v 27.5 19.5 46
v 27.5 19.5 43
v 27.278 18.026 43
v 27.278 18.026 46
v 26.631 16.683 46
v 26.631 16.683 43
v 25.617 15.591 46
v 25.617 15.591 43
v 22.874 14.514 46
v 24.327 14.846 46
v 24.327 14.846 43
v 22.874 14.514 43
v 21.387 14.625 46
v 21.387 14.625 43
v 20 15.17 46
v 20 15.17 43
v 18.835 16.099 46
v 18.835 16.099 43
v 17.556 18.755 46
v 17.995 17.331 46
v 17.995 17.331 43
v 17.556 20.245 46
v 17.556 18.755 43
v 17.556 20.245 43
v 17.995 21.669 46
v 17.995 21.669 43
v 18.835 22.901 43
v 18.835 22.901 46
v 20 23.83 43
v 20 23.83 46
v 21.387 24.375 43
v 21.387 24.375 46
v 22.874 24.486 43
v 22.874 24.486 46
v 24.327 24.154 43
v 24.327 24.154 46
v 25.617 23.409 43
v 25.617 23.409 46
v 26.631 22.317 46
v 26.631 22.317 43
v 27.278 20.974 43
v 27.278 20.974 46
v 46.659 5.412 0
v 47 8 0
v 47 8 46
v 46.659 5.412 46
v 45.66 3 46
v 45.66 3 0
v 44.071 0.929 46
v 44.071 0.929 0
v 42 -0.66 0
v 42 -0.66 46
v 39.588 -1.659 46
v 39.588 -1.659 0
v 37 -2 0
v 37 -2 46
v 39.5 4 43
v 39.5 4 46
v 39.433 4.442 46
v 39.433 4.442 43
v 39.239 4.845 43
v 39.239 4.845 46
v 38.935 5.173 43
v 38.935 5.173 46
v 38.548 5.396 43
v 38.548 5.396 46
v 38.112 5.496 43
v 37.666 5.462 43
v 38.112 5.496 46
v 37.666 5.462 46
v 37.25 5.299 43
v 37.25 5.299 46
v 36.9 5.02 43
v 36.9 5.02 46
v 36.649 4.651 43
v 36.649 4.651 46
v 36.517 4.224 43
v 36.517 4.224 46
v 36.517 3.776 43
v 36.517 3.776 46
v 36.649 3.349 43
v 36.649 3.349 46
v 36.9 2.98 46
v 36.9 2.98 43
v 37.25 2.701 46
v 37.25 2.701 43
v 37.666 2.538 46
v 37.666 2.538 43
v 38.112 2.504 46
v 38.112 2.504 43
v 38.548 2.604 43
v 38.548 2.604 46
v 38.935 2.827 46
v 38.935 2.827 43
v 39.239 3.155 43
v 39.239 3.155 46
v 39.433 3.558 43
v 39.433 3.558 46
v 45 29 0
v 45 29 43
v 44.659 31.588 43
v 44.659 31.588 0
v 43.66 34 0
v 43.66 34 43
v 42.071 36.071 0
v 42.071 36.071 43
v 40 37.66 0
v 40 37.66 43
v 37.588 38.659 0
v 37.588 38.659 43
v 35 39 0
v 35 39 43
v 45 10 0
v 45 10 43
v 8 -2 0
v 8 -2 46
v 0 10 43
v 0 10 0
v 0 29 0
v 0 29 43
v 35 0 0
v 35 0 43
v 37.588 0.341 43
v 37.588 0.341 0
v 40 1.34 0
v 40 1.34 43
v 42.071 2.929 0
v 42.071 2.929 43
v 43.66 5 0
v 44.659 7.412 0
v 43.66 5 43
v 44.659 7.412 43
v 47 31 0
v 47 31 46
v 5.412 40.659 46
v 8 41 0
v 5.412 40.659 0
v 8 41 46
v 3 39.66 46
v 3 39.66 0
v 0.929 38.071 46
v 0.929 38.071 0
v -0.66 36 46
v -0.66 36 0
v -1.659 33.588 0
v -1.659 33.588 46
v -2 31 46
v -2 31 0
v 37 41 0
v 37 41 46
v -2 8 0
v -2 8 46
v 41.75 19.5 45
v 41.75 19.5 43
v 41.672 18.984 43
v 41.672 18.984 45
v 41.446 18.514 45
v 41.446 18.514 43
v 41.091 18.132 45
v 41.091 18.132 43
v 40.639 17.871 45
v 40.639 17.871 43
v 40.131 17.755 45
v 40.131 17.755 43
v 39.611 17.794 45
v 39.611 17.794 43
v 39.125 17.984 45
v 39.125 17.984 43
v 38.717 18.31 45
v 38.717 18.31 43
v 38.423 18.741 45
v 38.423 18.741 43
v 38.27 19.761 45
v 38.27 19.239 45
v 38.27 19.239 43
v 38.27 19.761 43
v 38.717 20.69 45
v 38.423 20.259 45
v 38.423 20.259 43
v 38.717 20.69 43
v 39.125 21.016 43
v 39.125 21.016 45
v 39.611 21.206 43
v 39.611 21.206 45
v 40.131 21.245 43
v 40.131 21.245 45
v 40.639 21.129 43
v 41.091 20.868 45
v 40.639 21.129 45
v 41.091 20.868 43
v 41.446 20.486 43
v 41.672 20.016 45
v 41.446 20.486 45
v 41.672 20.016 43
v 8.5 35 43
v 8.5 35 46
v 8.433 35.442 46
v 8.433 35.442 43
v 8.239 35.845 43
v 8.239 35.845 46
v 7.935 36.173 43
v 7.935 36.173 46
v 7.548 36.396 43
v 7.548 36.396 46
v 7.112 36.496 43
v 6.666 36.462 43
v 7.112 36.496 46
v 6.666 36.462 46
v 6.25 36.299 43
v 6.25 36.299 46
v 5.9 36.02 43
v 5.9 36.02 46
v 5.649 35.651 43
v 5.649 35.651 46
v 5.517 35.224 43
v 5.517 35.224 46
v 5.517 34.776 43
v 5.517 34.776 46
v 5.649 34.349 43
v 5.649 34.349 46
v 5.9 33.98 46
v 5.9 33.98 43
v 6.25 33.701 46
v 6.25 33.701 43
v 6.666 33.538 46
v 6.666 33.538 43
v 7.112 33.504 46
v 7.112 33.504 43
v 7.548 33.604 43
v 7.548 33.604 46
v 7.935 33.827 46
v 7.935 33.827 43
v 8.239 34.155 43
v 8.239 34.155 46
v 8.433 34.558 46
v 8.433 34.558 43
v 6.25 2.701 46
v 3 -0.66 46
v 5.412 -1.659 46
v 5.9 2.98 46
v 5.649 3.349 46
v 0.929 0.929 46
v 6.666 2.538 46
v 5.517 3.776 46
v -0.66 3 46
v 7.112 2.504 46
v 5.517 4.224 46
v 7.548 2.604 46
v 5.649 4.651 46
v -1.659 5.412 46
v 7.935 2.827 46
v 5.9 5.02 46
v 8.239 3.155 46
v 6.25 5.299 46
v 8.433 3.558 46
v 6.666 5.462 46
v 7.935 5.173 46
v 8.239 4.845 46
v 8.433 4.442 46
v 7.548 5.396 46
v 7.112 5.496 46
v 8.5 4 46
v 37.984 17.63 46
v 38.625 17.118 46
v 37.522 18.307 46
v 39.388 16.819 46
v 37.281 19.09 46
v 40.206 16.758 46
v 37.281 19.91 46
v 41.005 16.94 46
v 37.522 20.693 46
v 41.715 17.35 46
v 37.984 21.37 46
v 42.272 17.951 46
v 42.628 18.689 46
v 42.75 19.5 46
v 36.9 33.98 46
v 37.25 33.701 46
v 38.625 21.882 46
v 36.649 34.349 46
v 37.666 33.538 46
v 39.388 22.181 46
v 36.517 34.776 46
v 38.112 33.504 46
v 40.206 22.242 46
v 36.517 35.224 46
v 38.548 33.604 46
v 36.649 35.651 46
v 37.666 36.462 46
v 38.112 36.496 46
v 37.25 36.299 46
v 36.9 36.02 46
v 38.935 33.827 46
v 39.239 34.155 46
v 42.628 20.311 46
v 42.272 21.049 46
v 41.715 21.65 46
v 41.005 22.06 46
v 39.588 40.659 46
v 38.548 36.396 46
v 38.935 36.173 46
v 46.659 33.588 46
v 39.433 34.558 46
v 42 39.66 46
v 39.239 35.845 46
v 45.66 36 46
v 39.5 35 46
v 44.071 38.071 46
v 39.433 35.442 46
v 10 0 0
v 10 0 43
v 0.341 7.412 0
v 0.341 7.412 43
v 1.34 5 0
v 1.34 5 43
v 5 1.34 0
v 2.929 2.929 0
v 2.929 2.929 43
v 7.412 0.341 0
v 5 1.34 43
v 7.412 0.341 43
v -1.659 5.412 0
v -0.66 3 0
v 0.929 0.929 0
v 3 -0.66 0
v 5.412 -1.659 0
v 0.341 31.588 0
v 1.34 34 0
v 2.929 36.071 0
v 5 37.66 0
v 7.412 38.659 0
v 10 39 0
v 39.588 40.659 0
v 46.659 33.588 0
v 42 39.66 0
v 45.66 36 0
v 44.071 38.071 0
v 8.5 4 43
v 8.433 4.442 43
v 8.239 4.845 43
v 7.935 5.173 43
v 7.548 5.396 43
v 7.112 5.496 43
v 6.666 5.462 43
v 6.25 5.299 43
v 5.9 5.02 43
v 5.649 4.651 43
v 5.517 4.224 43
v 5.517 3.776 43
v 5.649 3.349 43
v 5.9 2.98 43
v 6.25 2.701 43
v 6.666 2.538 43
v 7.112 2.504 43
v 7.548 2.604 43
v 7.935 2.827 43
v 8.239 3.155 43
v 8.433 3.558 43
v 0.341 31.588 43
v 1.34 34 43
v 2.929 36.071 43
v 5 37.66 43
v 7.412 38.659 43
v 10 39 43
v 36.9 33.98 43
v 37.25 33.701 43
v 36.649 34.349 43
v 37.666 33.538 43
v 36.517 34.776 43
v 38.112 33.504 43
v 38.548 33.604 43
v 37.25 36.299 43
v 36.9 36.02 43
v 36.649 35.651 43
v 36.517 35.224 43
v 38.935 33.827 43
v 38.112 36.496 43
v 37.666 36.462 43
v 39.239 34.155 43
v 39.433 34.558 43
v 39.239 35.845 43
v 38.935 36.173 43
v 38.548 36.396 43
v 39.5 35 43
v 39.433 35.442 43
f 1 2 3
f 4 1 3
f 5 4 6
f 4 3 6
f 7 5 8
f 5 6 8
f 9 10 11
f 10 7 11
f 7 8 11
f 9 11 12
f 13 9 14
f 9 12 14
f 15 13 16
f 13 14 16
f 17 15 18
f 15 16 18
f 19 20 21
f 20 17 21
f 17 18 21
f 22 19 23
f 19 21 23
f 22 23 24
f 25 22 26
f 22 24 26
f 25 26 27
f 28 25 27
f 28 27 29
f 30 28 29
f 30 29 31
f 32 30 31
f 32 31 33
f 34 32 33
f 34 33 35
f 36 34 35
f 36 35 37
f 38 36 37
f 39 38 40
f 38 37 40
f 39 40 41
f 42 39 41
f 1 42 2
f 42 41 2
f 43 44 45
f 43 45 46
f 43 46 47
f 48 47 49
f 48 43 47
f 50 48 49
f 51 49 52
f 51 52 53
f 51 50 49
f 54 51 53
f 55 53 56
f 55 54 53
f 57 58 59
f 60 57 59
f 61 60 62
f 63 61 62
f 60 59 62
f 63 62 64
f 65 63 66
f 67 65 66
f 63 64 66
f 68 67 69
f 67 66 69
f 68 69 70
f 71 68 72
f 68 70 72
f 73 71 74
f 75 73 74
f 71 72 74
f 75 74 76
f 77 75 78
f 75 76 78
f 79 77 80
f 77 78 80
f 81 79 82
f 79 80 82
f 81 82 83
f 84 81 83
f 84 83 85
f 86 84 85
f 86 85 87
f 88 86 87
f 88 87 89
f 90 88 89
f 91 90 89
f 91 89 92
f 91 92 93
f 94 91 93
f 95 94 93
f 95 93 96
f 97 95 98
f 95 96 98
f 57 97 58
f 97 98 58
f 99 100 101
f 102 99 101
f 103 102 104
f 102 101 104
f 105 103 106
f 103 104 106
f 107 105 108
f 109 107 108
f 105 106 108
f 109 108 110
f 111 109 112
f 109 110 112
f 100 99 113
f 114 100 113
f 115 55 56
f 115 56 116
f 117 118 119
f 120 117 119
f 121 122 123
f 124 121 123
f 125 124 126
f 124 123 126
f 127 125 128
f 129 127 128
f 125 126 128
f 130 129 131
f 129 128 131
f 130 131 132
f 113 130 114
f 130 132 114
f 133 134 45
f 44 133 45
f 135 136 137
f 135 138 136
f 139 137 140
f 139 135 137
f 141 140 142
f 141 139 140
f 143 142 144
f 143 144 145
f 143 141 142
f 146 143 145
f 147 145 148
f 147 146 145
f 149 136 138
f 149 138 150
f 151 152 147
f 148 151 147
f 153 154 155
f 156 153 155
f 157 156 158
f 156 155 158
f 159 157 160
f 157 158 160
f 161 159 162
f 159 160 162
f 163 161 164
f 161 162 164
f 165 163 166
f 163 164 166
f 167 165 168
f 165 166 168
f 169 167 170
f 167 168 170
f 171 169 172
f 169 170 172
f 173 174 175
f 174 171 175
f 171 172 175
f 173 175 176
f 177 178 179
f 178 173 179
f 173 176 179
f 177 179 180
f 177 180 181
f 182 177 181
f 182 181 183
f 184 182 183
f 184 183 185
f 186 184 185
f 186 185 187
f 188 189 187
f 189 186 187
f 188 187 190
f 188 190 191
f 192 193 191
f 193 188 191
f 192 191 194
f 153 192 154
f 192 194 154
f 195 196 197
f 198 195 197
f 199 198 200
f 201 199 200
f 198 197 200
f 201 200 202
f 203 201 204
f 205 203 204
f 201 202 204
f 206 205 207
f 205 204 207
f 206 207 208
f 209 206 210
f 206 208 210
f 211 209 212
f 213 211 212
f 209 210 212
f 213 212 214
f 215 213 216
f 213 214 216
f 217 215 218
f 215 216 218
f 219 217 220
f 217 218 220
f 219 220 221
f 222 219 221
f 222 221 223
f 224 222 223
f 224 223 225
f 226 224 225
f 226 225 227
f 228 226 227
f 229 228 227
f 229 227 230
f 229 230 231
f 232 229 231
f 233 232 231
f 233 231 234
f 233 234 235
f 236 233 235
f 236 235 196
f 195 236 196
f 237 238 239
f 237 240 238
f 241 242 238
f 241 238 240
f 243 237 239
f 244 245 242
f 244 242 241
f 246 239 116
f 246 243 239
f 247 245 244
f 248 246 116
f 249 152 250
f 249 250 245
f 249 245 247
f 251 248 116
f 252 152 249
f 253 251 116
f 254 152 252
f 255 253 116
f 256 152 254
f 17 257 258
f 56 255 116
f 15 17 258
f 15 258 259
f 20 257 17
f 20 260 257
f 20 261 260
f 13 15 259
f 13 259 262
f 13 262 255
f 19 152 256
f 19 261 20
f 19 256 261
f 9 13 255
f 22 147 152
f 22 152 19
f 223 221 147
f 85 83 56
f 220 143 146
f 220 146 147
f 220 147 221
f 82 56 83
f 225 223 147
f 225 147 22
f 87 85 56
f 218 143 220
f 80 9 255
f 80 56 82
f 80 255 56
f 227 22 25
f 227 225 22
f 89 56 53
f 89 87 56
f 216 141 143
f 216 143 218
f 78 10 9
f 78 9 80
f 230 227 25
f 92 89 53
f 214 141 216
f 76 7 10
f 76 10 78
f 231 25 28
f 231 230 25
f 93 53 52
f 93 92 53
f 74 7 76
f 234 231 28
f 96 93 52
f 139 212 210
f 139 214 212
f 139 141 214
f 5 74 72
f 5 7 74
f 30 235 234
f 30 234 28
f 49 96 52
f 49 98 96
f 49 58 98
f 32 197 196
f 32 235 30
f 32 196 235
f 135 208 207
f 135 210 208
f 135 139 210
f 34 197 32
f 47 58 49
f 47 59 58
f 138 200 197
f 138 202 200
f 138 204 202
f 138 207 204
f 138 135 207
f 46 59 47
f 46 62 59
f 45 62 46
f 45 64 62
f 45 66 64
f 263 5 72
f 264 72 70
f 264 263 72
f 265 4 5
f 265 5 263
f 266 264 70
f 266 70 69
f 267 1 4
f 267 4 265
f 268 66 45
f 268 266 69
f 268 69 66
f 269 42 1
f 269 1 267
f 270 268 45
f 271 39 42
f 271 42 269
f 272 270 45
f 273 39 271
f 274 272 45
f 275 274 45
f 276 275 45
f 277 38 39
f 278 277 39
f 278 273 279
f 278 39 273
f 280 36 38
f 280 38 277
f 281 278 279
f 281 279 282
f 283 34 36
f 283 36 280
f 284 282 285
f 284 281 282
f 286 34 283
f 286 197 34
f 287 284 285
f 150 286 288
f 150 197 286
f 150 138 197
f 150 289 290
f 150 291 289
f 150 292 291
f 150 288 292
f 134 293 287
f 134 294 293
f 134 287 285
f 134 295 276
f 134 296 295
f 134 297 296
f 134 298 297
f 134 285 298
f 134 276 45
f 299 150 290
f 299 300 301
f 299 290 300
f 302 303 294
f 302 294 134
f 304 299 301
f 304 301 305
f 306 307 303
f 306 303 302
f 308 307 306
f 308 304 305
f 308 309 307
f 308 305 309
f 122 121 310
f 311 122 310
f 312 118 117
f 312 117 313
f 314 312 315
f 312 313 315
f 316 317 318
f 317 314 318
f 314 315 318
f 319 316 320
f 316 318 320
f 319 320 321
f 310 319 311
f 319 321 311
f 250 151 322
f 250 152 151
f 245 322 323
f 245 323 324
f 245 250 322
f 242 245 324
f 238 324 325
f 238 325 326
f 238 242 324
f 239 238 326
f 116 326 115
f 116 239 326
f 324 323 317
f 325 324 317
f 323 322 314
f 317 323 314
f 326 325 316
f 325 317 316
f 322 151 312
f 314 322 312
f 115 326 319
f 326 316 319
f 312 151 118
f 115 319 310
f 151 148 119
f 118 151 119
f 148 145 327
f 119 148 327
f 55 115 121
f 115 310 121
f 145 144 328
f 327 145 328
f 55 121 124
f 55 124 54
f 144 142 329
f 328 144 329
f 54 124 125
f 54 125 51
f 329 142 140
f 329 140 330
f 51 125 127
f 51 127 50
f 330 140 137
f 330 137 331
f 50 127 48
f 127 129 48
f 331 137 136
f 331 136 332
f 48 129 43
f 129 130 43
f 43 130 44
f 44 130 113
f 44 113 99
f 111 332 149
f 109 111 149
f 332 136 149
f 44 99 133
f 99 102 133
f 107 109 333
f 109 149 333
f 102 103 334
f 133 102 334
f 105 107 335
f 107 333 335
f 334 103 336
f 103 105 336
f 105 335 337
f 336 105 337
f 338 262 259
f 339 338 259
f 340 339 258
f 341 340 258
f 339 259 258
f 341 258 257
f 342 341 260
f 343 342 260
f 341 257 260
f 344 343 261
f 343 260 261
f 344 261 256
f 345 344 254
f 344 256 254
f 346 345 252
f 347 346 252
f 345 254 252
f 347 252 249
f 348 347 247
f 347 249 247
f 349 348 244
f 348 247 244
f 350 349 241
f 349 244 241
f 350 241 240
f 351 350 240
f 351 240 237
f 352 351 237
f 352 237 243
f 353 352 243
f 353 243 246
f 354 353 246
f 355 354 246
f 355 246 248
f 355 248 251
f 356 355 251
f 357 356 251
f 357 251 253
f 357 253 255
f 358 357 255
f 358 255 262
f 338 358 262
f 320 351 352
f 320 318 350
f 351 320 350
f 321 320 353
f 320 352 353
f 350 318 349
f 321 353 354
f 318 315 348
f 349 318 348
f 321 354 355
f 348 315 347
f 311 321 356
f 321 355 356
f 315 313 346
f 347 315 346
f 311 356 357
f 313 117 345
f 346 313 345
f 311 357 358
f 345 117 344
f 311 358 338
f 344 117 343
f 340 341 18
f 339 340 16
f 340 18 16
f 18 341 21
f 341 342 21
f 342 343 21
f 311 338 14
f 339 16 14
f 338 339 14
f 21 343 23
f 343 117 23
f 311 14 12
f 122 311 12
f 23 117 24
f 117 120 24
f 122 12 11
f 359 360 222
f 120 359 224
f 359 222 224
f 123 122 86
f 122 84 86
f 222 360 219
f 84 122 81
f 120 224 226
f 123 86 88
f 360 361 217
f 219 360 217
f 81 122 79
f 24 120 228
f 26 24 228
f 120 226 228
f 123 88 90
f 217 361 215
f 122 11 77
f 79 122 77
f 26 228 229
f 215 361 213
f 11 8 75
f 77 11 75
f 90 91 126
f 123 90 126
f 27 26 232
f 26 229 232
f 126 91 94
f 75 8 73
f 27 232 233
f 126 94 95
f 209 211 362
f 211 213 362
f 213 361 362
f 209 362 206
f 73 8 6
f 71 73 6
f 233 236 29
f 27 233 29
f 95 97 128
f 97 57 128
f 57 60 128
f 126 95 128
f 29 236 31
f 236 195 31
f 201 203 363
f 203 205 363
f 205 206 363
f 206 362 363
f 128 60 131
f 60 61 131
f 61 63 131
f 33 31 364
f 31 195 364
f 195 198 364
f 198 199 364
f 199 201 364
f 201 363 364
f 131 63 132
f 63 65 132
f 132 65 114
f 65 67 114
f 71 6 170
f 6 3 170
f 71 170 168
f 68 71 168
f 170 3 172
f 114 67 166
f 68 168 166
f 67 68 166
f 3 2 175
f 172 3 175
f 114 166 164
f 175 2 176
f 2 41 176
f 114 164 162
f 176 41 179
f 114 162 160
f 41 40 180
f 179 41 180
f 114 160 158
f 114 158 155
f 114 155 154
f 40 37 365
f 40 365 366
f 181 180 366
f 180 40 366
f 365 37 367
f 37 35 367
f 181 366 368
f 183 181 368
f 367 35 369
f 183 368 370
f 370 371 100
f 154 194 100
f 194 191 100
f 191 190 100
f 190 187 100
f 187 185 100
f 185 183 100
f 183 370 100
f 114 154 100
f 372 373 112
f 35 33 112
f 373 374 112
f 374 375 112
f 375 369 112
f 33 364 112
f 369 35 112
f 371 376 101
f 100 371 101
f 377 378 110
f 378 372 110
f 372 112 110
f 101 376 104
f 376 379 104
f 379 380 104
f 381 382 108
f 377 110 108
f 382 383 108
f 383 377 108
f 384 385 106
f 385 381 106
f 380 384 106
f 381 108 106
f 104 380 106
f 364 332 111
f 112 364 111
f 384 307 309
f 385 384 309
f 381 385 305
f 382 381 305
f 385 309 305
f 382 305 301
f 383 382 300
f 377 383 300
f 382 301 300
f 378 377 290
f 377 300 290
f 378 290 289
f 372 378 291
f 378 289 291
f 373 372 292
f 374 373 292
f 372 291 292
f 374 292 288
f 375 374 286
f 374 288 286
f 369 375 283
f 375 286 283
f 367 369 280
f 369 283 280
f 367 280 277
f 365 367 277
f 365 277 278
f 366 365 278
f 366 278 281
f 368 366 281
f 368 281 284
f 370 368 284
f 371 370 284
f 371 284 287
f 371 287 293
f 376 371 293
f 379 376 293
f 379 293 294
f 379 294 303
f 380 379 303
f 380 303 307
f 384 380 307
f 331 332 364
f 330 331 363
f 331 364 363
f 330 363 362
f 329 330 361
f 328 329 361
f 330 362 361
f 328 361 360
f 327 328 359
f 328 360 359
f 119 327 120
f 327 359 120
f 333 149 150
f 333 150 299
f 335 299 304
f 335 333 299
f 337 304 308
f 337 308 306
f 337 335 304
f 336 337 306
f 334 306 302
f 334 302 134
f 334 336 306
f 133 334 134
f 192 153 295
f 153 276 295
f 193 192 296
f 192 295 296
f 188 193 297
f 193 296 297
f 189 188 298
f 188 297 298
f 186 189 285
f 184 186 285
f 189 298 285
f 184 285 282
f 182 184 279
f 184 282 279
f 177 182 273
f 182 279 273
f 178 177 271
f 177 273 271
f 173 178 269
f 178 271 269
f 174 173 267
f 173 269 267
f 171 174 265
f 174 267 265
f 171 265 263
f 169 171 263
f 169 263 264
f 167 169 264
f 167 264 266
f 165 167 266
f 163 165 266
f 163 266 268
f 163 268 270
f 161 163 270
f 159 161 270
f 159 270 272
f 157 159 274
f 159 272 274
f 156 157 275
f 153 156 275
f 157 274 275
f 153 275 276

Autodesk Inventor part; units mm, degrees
ref_plane "YZ Plane" through (0, 0, 0) normal (1, 0, 0) x (0, 1, 0)
ref_plane "XZ Plane" through (0, 0, 0) normal (0, 1, 0) x (-1, 0, 0)
ref_plane "XY Plane" through (0, 0, 0) normal (0, 0, 1) x (1, 0, 0)
sketch "Sketch1" plane through (0, 0, 0) normal (0, 0, 1) x (1, 0, 0)
  line L0 (0, 0) -> (0, 39)
  line L1 (0, 39) -> (45, 39)
  line L2 (45, 39) -> (45, 0)
  line L3 (45, 0) -> (0, 0)
  line L4 (0, 39) -> (-2, 39) construction
  line L5 (-2, 39) -> (-2, 41) construction
  line L6 (-2, 41) -> (47, 41)
  line L7 (47, 41) -> (47, -2)
  line L8 (47, -2) -> (-2, -2)
  line L9 (-2, -2) -> (-2, 41)
  dimension "d0" = 39
  dimension "d1" = 45
  dimension "d2" = 2
  dimension "d3" = 2
  dimension "d4" = 49
  dimension "d5" = 43
  dimension "d6" = 49
extrude "Extrusion1" add sketch "Sketch1" along normal blind 43
sketch "Sketch2" plane through (0, 0, 43) normal (0, 0, 1) x (1, 0, 0)
  line L0 (-2, -2) -> (47, 41) construction
  line L1 (47, 41) -> (-2, 41)
  line L2 (47, 41) -> (-2, 41) projected
  line L3 (-2, 41) -> (22.5, 19.5) construction
  line L4 (-2, 41) -> (-2, -2)
  line L5 (-2, -2) -> (47, -2)
  line L6 (-2, -2) -> (47, -2) projected
  line L7 (47, -2) -> (47, 41)
  line L8 (-2, 41) -> (47, 41)
  circle A0 centre (22.5, 19.5) radius 5
  line L9 (27.5, 19.5) -> (40, 19.5) construction
  circle A1 centre (40, 19.5) radius 1.75
  point P0 (0, 0)
  dimension "d9" = 10
  dimension "d12" = 12.5
  dimension "d13" = 3.5
  dimension "d14" = 21.5
extrude "Extrusion3" add sketch "Sketch2" along normal blind 3
fillet "Fillet1" radius 10 8 edges at (-2, 41, 23) (0, 39, 21.5) (0, 0, 21.5) (-2, -2, 23) (47, -2, 23) (45, 0, 21.5) (47, 41, 23) (45, 39, 21.5)
chamfer "Chamfer1" distance 1 angle 45 1 edges at (38.25, 19.5, 46)
sketch "Sketch3" plane through (0, 0, 46) normal (0, 0, 1) x (1, 0, 0)
  circle A0 centre (22.5, 19.5) radius 5 construction
  line L0 (22.5, 19.5) -> (22.5, 41) construction
  line L1 (37, 41) -> (8, 41) construction
  line L2 (22.5, 19.5) -> (22.5, -2) construction
  line L3 (8, -2) -> (37, -2) construction
  line L4 (22.5, 19.5) -> (47, 19.5) construction
  line L5 (47, 19.5) -> (22.5, 19.5) construction
  line L6 (-2.181, 19.5) -> (22.5, 19.5) construction
  line L7 (38, 35) -> (38, 4) construction
  line L8 (38, 4) -> (7, 4) construction
  line L9 (7, 4) -> (7, 35) construction
  line L10 (7, 35) -> (38, 35) construction
  line L11 (38, 35) -> (7, 4) construction
  line L12 (38, 4) -> (7, 35) construction
  circle A1 centre (38, 35) radius 1.5
  circle A2 centre (7, 35) radius 1.5
  circle A3 centre (7, 4) radius 1.5
  circle A4 centre (38, 4) radius 1.5
  point P0 (0, 0)
  dimension "d22" = 31
  dimension "d23" = 31
  dimension "d24" = 3
  dimension "d25" = 3
  dimension "d26" = 3
  dimension "d27" = 3
extrude "Extrusion4" cut sketch "Sketch3" against normal blind 57.5
properties part number "Drill-NEMA17_Adapter"
